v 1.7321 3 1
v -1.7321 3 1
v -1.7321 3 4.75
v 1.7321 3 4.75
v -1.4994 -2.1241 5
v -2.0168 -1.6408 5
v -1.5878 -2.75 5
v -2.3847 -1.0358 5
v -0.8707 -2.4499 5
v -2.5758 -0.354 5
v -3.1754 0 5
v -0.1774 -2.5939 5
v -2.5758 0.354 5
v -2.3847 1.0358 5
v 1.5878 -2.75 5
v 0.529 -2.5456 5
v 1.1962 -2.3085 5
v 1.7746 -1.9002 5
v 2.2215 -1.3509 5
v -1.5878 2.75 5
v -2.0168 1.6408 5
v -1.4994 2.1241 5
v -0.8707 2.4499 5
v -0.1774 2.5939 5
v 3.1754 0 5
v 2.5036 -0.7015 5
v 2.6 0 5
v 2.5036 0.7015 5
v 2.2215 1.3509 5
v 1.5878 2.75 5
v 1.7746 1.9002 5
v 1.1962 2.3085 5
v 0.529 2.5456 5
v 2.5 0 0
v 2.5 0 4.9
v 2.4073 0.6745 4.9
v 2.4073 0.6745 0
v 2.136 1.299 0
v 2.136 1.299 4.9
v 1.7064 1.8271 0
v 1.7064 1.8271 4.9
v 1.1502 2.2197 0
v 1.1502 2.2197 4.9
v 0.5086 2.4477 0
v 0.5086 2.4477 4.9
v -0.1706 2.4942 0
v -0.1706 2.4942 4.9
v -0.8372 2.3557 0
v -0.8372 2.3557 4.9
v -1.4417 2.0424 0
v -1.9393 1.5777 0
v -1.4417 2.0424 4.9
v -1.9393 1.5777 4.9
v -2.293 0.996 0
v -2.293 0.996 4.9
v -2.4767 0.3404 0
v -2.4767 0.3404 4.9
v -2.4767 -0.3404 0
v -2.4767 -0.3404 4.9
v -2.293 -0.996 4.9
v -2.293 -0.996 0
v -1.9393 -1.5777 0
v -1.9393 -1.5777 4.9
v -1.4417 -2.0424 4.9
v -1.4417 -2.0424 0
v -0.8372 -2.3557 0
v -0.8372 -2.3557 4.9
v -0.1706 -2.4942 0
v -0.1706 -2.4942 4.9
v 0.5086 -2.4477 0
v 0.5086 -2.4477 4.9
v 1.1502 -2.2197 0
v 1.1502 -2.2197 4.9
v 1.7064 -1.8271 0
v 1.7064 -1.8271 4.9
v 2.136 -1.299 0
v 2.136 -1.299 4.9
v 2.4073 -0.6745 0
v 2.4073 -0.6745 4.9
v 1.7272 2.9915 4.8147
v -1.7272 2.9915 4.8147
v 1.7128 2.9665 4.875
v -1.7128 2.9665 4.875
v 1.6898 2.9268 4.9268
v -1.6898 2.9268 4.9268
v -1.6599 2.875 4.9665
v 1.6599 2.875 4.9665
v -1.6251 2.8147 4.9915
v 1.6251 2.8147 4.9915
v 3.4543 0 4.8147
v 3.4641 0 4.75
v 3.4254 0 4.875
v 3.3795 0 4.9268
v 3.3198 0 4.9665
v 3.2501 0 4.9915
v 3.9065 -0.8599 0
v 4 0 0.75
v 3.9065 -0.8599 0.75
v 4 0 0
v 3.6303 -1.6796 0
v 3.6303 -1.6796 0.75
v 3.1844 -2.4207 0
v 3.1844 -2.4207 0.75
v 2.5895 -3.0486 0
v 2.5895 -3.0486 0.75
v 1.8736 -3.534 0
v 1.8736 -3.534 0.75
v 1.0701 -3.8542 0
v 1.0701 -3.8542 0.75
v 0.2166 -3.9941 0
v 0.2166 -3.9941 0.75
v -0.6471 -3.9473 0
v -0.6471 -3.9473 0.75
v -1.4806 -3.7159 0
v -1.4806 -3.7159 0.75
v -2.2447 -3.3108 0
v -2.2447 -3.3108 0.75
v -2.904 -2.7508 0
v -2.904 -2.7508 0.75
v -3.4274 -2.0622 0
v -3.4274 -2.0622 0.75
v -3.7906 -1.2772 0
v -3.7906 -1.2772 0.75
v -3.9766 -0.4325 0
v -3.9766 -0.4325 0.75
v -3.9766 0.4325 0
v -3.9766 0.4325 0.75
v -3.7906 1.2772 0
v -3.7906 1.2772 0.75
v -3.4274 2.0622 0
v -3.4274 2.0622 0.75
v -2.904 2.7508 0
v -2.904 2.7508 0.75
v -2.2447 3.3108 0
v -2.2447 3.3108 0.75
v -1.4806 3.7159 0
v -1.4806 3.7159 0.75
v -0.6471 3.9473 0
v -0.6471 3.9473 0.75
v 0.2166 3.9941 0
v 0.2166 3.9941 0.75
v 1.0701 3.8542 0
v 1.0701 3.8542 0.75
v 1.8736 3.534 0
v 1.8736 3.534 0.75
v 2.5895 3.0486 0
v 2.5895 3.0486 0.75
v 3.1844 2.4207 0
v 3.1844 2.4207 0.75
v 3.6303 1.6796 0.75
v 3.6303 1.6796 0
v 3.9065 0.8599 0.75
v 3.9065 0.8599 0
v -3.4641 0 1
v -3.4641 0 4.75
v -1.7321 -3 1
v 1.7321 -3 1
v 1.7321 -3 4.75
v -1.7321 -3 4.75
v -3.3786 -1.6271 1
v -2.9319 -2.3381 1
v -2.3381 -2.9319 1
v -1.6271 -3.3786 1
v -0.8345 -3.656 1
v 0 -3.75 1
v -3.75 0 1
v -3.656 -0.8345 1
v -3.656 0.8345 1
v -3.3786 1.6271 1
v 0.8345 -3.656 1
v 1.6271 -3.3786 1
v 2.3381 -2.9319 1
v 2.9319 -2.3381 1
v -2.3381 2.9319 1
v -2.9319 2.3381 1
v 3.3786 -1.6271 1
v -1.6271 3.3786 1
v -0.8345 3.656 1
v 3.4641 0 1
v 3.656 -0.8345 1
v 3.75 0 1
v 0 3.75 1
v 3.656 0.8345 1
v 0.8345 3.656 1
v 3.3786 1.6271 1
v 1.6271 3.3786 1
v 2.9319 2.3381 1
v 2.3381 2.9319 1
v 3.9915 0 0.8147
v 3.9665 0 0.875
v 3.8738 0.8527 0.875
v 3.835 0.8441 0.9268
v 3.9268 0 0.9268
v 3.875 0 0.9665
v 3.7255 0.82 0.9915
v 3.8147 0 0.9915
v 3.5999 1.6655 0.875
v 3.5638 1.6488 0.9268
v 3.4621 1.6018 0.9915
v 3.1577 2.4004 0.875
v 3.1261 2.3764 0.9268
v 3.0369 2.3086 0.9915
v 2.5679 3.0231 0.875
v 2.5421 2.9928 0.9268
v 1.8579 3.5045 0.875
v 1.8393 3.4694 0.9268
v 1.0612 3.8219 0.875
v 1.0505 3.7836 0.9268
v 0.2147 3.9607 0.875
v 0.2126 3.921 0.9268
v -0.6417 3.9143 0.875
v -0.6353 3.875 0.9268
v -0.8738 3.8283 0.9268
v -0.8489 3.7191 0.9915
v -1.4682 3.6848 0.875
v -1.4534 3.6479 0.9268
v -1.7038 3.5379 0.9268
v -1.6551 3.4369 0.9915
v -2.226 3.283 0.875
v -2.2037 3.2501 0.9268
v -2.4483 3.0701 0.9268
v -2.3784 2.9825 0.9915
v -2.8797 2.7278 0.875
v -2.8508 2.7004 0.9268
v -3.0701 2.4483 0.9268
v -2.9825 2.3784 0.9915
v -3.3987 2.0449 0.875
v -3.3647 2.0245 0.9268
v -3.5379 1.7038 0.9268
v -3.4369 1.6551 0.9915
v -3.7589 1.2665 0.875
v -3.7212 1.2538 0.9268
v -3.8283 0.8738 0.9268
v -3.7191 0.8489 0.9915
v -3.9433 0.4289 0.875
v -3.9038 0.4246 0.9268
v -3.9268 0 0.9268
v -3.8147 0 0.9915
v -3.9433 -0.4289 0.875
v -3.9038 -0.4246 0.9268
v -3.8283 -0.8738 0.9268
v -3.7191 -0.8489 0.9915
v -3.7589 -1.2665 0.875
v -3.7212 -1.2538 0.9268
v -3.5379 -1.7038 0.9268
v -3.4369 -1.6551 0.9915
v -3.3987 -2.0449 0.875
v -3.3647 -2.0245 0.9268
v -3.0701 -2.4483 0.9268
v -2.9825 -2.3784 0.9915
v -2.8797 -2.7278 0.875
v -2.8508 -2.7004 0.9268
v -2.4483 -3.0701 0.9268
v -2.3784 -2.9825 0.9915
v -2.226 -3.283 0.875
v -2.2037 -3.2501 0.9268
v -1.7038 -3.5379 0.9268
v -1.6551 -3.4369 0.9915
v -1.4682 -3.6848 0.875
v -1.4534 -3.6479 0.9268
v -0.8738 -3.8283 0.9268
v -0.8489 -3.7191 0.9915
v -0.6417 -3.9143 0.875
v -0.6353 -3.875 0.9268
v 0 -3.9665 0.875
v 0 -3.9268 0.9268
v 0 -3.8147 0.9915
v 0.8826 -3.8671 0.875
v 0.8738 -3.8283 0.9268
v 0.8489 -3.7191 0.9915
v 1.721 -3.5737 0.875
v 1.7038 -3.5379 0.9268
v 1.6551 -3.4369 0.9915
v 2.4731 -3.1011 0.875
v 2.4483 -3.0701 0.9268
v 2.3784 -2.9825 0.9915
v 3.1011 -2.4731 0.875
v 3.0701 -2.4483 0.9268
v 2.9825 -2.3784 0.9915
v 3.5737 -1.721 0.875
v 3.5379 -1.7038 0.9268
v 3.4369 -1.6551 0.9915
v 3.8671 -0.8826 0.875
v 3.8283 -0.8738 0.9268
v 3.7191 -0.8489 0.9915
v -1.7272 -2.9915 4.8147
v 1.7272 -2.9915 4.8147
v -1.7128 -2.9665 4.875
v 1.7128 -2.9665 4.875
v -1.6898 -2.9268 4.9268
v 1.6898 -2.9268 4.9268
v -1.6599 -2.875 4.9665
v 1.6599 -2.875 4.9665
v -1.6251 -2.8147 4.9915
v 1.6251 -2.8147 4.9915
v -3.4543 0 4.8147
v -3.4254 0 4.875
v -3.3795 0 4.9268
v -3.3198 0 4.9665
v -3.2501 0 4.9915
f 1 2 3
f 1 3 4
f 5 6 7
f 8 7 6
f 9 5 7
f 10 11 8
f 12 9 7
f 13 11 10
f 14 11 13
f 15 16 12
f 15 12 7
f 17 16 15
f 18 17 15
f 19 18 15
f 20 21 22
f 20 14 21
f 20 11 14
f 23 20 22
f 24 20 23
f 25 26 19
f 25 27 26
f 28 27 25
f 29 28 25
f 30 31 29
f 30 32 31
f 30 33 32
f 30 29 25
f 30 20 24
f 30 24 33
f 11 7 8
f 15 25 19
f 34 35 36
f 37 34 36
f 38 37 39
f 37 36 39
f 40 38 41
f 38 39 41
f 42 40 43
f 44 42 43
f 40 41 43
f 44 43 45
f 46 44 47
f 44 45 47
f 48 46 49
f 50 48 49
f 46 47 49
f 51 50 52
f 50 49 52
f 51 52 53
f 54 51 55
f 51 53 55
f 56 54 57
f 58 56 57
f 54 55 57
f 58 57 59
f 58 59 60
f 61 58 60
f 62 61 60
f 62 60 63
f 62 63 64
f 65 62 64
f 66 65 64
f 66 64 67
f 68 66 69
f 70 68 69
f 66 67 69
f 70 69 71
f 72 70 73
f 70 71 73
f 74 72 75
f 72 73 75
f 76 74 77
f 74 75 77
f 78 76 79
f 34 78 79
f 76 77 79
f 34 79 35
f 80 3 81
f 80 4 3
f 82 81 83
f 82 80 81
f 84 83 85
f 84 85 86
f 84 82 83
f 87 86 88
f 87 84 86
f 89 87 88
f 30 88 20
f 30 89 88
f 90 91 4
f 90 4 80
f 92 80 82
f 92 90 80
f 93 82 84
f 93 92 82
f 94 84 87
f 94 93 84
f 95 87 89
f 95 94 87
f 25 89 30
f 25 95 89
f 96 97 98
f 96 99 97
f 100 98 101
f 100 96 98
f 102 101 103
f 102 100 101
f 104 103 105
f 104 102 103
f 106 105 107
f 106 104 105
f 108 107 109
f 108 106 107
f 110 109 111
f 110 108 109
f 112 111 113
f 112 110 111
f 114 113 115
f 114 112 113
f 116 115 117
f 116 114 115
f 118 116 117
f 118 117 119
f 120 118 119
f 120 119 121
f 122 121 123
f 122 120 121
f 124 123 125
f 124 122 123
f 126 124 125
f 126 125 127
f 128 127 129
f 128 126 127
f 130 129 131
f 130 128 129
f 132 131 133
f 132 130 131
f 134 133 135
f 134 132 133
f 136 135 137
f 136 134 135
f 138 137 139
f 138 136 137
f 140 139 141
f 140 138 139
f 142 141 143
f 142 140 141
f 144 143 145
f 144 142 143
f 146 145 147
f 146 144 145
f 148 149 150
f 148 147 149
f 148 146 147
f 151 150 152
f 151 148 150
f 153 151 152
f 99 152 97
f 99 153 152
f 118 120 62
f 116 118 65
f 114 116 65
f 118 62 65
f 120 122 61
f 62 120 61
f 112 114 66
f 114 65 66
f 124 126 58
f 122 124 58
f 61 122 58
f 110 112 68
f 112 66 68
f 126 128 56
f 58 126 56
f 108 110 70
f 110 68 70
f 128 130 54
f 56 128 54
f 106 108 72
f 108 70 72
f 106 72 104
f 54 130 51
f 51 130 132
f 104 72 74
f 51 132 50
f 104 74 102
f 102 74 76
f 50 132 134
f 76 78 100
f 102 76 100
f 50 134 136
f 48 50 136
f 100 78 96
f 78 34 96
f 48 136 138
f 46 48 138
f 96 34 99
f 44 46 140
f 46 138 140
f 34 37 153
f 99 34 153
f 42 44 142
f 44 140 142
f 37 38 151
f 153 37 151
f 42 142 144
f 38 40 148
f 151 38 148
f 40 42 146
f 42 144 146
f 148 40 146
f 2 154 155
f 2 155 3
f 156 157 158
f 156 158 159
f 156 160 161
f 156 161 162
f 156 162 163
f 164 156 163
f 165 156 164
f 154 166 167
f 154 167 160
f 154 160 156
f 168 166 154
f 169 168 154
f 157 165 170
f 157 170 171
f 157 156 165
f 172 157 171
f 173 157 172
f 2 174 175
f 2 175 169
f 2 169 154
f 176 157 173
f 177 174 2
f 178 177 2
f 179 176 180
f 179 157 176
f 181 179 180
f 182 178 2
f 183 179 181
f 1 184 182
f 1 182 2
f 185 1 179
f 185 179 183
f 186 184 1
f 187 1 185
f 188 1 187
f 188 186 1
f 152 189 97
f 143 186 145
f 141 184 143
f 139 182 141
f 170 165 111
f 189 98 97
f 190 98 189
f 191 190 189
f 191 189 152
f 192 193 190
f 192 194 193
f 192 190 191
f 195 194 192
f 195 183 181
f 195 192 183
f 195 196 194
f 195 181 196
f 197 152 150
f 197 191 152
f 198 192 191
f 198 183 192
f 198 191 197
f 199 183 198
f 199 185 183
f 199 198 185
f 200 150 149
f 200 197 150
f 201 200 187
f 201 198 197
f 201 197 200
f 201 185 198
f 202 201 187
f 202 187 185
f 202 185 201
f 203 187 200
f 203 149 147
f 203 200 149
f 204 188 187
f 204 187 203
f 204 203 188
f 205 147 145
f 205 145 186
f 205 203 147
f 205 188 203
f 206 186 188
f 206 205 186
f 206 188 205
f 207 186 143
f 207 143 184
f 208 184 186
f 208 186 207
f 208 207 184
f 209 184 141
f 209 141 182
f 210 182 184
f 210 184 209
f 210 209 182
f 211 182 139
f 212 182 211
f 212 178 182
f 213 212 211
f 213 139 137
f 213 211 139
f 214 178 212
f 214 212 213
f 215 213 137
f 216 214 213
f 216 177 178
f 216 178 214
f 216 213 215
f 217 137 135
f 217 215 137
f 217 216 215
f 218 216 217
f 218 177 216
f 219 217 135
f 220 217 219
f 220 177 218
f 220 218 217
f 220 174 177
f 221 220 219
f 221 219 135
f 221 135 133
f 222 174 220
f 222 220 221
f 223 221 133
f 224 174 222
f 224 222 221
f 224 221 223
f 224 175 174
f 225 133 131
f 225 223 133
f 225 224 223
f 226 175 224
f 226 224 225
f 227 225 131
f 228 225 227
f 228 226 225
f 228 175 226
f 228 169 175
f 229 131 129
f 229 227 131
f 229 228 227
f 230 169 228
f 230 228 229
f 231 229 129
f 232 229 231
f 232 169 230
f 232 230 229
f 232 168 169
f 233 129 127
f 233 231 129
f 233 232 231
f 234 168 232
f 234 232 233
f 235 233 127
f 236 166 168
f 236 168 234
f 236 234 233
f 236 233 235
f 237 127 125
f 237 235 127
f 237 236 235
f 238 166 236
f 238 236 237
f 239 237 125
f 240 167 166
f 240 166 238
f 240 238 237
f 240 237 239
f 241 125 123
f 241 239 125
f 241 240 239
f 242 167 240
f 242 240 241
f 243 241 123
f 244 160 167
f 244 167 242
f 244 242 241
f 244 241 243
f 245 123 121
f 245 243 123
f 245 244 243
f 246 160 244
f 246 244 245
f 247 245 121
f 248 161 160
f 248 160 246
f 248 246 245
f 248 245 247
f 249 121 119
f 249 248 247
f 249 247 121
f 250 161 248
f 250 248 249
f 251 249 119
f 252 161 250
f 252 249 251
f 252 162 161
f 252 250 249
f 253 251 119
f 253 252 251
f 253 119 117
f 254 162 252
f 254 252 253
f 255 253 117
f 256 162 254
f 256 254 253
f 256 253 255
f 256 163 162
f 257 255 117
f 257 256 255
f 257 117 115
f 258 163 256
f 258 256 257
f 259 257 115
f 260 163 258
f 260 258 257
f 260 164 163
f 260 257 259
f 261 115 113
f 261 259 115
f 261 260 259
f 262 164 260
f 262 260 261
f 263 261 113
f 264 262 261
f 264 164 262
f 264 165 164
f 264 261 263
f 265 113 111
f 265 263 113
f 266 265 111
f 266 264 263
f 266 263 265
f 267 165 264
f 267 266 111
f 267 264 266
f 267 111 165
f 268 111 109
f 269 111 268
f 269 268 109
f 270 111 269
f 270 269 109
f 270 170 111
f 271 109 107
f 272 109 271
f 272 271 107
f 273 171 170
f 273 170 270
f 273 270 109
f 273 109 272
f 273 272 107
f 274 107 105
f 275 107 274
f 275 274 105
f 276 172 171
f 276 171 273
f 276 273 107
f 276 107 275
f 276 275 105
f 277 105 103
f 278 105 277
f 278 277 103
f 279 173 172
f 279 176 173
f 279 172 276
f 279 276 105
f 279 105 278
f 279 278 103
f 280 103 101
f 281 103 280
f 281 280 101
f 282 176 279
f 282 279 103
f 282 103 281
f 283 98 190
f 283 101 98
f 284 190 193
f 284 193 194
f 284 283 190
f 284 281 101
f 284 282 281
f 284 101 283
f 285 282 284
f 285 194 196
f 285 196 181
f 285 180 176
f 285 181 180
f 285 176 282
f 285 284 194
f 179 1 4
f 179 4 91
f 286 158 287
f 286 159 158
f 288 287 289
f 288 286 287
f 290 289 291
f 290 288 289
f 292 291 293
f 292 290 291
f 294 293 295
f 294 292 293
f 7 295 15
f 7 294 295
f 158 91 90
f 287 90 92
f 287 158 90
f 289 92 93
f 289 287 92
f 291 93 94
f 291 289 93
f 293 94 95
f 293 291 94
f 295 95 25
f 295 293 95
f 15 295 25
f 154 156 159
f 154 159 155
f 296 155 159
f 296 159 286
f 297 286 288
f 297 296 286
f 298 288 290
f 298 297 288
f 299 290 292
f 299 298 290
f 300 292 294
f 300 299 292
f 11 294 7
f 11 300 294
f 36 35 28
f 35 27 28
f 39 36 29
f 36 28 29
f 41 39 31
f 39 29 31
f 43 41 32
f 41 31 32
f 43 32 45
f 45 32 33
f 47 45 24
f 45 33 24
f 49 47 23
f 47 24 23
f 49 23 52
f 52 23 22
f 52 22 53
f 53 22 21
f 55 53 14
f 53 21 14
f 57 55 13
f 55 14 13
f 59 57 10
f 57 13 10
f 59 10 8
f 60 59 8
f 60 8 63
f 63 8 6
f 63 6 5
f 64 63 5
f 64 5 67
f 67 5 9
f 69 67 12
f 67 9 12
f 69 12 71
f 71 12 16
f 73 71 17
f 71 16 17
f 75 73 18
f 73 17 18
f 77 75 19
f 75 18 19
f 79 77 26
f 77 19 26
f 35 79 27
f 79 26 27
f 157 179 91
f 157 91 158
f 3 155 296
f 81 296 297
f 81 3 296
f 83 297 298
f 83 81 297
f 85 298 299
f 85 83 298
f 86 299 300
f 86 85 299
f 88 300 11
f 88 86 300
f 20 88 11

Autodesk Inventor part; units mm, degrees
ref_plane "YZ Plane" through (0, 0, 0) normal (1, 0, 0) x (0, 1, 0)
ref_plane "XZ Plane" through (0, 0, 0) normal (0, 1, 0) x (-1, 0, 0)
ref_plane "XY Plane" through (0, 0, 0) normal (0, 0, 1) x (1, 0, 0)
sketch "草图1" plane through (0, 0, 0) normal (0, 0, 1) x (1, 0, 0)
  circle A0 centre (0, 0) radius 4
  dimension "d0" = 8
extrude "拉伸1" add sketch "草图1" along normal blind 1
sketch "草图2" plane through (0, 0, 1) normal (0, 0, 1) x (1, 0, 0)
  line L0 (1.7321, -3) -> (-1.7321, -3)
  line L1 (-1.7321, -3) -> (-3.4641, 0)
  line L2 (-3.4641, 0) -> (-1.7321, 3)
  line L3 (-1.7321, 3) -> (1.7321, 3)
  line L4 (1.7321, 3) -> (3.4641, 0)
  line L5 (3.4641, 0) -> (1.7321, -3)
  line L6 (0, 0) -> (0, 0.9644)
  point P0 (0, 3)
  dimension "d3" = 0.9644
  dimension "d4" = 6
extrude "拉伸2" add sketch "草图2" along normal blind 4
sketch "草图3" plane through (0, 0, 5) normal (0, 0, 1) x (1, 0, 0)
  circle A0 centre (0, 0) radius 2.5
  dimension "d7" = 5
extrude "拉伸3" cut sketch "草图3" against normal through all
thread "螺纹1" size "M5x0.8" class "6H" standard "ANSI Metric M Profile" full length
fillet "圆角1" radius 0.25 7 edges at (-2.5981, 1.5, 5) (-2.5981, -1.5, 5) (0, 3, 5) (2.5981, 1.5, 5) (2.5981, -1.5, 5) (0, -3, 5) (-4, 0, 1)
chamfer "倒角1" distance 0.1 angle 45 1 edges at (-2.5, 0, 5)
properties part number "刀夹片紧固螺帽"
